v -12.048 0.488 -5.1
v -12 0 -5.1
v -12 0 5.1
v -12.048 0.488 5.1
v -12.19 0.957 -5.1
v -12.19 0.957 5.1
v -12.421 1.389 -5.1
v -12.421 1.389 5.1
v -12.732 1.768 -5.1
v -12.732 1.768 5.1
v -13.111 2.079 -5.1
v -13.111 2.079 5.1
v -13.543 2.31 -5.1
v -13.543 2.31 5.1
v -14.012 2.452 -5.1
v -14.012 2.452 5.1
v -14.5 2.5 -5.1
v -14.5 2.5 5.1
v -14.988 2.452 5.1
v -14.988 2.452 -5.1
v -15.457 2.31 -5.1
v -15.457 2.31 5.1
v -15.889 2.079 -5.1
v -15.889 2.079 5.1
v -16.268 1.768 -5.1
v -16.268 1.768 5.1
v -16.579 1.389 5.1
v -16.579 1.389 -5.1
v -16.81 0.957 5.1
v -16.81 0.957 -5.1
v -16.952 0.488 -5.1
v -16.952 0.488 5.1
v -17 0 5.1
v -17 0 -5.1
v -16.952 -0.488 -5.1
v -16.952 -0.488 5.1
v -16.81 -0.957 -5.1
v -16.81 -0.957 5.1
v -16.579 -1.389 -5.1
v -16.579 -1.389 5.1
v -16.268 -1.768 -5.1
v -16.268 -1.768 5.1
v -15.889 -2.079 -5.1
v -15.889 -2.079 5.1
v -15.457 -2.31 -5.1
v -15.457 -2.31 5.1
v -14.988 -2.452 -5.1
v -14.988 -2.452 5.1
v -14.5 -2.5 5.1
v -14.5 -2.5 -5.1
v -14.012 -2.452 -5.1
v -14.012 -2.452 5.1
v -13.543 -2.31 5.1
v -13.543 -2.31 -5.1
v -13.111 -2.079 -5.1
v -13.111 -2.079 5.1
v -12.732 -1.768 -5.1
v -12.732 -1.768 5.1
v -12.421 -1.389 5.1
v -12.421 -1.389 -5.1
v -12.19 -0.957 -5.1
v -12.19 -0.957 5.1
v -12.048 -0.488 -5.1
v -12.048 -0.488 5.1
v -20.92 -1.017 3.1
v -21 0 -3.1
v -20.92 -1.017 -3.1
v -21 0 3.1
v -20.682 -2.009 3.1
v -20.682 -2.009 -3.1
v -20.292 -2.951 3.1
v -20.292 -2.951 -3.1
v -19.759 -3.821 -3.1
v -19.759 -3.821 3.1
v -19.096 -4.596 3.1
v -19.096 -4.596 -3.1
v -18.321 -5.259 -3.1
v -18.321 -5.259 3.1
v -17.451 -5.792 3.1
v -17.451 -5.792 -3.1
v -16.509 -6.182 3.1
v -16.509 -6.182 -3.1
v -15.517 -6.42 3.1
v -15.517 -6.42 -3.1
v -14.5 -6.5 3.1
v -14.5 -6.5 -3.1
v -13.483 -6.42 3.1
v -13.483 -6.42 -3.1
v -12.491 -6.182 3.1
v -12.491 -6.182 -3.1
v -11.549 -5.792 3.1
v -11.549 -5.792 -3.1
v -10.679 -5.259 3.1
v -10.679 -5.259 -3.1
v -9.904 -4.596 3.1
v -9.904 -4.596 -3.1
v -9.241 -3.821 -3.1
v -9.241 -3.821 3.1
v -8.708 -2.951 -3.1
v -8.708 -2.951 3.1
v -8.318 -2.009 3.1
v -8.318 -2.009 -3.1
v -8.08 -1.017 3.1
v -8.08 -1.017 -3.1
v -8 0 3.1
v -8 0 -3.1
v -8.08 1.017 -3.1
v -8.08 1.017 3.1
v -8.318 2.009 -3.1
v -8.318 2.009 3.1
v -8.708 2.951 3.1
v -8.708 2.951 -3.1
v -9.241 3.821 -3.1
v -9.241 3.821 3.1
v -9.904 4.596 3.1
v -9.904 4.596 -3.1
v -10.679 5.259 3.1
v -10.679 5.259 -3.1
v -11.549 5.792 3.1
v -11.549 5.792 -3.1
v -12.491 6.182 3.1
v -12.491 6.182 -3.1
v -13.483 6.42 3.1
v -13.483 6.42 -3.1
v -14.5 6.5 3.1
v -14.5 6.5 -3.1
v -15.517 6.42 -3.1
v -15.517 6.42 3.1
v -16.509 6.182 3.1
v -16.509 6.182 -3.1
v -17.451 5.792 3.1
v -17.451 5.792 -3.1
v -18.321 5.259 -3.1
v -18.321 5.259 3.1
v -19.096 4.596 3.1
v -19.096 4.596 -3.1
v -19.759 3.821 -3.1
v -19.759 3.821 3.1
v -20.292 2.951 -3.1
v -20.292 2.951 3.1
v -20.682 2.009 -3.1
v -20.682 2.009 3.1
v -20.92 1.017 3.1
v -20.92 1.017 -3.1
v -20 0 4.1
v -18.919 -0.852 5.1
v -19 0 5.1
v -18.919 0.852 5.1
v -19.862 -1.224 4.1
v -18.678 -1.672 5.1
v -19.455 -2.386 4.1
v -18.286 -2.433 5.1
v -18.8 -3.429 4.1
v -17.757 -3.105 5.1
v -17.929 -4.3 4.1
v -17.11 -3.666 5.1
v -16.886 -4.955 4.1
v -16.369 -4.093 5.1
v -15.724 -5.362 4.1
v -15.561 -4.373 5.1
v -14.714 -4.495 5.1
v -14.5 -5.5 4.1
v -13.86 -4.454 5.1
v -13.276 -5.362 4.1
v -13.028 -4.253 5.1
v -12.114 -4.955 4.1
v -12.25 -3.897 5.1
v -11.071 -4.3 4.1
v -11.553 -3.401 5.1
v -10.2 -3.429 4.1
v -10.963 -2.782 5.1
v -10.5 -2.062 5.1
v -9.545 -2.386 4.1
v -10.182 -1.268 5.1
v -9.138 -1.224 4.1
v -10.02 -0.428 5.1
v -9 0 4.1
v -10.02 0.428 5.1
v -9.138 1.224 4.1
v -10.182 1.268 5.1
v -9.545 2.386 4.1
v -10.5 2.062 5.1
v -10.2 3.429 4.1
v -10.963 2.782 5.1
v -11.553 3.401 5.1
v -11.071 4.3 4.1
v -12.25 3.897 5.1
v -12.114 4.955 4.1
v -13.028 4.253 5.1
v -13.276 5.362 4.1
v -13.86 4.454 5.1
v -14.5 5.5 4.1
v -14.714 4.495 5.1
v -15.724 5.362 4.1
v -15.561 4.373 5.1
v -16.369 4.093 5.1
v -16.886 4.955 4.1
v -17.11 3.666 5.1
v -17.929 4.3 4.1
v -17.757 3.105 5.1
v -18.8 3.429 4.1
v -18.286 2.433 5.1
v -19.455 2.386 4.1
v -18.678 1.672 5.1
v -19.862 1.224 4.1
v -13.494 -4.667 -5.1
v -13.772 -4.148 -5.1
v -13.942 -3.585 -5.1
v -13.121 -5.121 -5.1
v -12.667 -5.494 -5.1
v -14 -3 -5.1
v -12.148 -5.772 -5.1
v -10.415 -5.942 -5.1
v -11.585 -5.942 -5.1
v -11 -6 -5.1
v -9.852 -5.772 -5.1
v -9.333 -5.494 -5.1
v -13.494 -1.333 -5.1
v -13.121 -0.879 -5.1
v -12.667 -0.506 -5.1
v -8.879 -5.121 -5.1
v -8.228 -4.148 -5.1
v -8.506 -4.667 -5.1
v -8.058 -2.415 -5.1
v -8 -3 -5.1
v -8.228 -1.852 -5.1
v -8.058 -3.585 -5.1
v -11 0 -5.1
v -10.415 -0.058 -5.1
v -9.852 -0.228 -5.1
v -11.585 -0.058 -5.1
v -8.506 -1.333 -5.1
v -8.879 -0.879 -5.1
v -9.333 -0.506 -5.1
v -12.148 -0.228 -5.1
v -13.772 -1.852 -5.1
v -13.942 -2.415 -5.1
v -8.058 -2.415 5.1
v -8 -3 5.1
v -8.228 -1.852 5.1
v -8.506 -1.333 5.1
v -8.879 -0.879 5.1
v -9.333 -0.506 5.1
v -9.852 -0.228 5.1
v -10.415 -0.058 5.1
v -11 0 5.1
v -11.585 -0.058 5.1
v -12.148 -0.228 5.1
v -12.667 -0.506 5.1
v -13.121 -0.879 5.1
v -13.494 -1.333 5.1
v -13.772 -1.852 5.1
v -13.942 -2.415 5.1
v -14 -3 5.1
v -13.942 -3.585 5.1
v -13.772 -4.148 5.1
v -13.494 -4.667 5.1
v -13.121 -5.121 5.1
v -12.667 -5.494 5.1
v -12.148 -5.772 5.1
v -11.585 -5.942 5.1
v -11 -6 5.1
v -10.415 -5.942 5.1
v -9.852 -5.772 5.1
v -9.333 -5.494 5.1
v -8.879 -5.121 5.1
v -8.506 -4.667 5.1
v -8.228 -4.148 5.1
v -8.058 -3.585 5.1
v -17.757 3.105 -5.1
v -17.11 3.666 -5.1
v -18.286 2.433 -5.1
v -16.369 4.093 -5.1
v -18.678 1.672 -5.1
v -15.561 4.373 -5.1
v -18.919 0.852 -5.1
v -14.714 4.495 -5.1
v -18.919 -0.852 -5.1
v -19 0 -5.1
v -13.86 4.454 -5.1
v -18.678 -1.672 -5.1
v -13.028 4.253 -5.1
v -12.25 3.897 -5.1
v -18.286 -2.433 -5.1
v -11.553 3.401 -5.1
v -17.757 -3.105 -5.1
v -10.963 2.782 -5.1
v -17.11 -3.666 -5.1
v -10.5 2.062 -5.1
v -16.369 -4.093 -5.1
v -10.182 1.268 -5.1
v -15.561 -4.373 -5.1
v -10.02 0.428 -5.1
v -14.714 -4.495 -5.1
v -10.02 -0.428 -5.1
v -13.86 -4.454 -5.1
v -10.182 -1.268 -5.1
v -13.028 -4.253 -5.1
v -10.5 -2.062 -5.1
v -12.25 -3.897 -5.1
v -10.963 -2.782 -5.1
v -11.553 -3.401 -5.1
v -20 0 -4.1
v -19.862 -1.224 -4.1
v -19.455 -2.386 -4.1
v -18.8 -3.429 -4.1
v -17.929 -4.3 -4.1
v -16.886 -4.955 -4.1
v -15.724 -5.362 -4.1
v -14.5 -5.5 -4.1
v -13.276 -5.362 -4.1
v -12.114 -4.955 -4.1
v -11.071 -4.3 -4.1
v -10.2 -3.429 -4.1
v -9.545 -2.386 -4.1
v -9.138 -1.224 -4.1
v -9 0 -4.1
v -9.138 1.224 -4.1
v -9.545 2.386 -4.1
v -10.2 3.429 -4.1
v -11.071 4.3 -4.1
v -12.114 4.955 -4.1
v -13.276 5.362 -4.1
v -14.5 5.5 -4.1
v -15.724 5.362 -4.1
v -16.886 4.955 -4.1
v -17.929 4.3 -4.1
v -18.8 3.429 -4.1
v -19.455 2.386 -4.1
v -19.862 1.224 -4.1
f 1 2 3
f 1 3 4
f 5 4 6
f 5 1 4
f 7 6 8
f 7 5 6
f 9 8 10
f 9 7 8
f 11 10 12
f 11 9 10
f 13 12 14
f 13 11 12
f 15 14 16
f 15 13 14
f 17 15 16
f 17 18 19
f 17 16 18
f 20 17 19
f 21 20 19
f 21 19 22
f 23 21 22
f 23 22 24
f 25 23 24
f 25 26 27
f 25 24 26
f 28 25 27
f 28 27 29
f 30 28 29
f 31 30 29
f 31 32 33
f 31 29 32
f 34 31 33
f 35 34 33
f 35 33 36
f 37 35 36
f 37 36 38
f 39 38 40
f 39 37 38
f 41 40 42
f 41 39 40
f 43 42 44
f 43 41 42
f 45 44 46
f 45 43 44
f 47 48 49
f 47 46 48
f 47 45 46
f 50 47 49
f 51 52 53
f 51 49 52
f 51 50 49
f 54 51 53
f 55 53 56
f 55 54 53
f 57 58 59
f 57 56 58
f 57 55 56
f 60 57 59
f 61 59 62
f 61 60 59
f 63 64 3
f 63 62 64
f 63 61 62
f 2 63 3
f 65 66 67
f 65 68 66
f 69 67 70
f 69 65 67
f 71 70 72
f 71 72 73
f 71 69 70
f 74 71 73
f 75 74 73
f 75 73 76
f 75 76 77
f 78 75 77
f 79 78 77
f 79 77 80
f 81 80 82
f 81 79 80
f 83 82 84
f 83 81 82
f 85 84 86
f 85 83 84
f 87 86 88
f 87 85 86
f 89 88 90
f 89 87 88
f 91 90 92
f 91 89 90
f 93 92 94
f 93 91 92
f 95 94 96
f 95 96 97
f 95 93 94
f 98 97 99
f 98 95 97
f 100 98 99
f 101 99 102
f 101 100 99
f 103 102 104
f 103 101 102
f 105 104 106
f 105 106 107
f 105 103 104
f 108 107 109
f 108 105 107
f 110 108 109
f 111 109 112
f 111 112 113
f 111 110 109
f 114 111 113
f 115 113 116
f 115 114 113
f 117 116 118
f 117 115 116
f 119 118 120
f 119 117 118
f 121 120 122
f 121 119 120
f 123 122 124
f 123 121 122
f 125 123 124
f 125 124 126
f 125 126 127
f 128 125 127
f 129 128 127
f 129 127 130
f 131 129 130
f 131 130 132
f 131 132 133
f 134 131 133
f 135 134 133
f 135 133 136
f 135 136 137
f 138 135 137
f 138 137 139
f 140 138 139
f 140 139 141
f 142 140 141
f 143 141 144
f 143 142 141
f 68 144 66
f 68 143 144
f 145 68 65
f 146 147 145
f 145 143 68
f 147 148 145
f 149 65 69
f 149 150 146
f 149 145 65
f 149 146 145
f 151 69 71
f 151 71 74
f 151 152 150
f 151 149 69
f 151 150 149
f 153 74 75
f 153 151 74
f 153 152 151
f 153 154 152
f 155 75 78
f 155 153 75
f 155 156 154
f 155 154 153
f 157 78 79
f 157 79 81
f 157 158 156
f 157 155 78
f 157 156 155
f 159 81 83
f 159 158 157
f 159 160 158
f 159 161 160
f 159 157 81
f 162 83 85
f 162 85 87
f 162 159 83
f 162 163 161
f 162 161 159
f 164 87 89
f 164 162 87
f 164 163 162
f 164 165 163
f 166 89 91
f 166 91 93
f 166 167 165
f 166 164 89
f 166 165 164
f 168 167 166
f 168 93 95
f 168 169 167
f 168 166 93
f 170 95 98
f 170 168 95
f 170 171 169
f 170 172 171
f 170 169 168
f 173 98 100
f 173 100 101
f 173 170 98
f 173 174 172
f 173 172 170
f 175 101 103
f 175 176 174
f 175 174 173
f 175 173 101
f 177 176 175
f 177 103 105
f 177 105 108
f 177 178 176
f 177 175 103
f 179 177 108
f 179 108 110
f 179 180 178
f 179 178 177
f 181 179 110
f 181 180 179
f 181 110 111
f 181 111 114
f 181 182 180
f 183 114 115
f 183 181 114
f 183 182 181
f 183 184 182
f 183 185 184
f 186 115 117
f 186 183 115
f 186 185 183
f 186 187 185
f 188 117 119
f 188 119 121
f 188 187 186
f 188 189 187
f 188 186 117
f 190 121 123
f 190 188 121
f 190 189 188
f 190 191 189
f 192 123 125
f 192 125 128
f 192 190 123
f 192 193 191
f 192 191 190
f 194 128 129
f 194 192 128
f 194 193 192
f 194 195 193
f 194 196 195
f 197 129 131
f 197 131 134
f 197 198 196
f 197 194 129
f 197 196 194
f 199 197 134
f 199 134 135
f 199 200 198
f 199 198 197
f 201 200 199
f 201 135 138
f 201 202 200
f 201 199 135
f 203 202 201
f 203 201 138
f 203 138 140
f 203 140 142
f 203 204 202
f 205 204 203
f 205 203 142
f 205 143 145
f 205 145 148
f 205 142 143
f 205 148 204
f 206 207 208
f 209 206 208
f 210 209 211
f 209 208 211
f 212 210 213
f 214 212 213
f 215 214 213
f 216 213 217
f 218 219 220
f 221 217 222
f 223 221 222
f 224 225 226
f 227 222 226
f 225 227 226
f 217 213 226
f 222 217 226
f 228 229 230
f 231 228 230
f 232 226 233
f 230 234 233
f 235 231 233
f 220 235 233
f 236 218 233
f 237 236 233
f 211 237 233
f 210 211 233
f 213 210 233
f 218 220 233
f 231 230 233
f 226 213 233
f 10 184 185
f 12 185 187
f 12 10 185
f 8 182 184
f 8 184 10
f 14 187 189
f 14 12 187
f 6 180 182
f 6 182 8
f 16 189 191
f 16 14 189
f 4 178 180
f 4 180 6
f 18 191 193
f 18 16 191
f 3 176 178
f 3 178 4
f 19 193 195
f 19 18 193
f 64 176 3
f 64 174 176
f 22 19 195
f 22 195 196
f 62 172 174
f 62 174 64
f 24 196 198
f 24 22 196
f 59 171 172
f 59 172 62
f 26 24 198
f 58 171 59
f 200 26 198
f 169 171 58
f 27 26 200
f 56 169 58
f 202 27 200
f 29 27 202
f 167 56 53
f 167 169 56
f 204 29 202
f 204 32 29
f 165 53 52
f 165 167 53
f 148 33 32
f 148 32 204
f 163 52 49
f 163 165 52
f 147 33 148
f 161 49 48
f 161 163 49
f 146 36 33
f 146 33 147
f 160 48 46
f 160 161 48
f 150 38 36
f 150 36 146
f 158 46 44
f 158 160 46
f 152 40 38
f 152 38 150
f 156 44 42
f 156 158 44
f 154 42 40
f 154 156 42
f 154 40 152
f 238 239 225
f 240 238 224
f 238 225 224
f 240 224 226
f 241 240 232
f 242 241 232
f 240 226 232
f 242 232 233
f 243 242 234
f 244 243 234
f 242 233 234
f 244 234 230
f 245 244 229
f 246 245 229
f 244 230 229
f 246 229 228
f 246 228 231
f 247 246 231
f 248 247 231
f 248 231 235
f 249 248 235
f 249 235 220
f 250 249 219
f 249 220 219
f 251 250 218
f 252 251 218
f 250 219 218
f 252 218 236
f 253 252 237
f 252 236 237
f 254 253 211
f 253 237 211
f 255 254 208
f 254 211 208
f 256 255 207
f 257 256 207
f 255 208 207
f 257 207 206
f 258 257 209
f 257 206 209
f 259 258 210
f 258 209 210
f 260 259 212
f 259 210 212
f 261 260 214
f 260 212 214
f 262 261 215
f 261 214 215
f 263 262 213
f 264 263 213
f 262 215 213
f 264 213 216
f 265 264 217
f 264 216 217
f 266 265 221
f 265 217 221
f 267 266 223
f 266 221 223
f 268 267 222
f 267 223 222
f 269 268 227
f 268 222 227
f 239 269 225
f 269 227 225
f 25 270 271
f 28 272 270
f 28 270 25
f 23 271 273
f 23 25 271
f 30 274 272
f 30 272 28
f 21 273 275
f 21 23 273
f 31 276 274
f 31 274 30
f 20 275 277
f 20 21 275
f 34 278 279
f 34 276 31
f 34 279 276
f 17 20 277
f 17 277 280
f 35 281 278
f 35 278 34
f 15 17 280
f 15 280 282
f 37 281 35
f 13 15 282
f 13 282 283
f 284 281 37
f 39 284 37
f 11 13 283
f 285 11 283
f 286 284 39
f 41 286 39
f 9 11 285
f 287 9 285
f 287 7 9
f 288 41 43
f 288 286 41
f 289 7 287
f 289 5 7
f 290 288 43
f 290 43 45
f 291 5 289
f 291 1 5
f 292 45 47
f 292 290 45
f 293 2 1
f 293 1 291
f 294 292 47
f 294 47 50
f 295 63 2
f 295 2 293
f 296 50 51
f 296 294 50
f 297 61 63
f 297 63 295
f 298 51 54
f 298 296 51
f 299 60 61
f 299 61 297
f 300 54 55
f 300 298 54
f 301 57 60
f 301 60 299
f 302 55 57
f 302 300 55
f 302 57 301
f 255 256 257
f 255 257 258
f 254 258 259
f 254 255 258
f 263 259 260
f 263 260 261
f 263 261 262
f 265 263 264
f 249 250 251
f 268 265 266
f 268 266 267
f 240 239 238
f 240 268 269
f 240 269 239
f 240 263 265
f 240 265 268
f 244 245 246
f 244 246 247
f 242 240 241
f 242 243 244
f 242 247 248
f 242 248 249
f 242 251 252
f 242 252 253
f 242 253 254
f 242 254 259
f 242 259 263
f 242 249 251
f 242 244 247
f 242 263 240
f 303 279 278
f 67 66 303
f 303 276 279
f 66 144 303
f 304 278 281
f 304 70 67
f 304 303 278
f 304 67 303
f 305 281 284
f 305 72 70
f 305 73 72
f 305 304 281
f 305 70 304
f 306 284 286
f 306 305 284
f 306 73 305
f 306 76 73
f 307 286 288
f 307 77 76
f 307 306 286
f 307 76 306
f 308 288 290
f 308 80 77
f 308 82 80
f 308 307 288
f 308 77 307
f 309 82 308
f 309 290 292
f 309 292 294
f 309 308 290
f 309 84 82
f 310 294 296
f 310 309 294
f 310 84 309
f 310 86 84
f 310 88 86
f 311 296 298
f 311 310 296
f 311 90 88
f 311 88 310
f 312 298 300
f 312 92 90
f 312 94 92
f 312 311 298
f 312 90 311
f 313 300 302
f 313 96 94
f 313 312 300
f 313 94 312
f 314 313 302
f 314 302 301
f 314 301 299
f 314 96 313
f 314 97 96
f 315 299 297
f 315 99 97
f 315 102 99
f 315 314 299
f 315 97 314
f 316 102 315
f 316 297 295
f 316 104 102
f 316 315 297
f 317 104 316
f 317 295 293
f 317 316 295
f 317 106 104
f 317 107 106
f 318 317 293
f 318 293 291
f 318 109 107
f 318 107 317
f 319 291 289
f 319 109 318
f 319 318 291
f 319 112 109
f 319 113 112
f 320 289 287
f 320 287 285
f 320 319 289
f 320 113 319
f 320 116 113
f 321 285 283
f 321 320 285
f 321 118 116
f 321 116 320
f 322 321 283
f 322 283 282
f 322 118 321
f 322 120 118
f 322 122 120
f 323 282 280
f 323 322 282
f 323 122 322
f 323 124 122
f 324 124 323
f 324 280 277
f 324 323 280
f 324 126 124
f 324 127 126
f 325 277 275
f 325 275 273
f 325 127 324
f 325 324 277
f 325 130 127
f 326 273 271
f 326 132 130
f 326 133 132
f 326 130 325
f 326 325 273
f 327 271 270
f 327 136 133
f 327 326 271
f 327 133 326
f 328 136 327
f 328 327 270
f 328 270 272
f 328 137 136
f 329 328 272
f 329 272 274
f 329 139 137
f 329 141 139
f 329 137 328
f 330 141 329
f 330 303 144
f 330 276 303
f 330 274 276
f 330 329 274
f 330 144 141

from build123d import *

# Parameters (mm, degrees)
BOSS_EXTRUDE1_DEPTH      = 5.1
BOSS_EXTRUDE1_DEPTH_BACK = 5.1
SKETCH3_R                = 3
CUT_EXTRUDE1_DEPTH       = 23.566789758
CUT_EXTRUDE1_DEPTH_BACK  = 23.566789758
SKETCH7_R                = 2.5


with BuildPart() as part:
    # Sketch3 → Boss-Extrude1 (new, two sides: drawn at the far end of the back side and taken through both)
    with BuildSketch(Plane.XY.offset(-BOSS_EXTRUDE1_DEPTH_BACK)):
        with Locations((-11, -3)):
            Circle(SKETCH3_R)
    extrude(amount=BOSS_EXTRUDE1_DEPTH + BOSS_EXTRUDE1_DEPTH_BACK)


with BuildPart() as body_2:
    # Sketch1 → Revolve1 (revolve)
    with BuildSketch(Plane(origin=(0, 0, 0), x_dir=(1, 0, 0), z_dir=(0, 1, 0)), mode=Mode.PRIVATE) as revolve1_sk:
        Polygon((-8, -3.1), (-10, -5.1), (-14.5, -5.1), (-14.5, 5.1), (-10, 5.1), (-8, 3.1), align=None)
    revolve(revolve1_sk.sketch.rotate(Axis((-14.5, 0, -5.1), (0, 0, 1)), 180), axis=Axis((-14.5, 0, -5.1), (0, 0, 1)))

    # Sketch7 → Cut-Extrude1 (cut, two sides: drawn at the far end of the back side and taken through both)
    with BuildSketch(Plane.XY.offset(-CUT_EXTRUDE1_DEPTH_BACK)):
        with Locations((-14.5, 0)):
            Circle(SKETCH7_R)
    extrude(amount=CUT_EXTRUDE1_DEPTH + CUT_EXTRUDE1_DEPTH_BACK, mode=Mode.SUBTRACT)


solid = Compound([part.part, body_2.part])
